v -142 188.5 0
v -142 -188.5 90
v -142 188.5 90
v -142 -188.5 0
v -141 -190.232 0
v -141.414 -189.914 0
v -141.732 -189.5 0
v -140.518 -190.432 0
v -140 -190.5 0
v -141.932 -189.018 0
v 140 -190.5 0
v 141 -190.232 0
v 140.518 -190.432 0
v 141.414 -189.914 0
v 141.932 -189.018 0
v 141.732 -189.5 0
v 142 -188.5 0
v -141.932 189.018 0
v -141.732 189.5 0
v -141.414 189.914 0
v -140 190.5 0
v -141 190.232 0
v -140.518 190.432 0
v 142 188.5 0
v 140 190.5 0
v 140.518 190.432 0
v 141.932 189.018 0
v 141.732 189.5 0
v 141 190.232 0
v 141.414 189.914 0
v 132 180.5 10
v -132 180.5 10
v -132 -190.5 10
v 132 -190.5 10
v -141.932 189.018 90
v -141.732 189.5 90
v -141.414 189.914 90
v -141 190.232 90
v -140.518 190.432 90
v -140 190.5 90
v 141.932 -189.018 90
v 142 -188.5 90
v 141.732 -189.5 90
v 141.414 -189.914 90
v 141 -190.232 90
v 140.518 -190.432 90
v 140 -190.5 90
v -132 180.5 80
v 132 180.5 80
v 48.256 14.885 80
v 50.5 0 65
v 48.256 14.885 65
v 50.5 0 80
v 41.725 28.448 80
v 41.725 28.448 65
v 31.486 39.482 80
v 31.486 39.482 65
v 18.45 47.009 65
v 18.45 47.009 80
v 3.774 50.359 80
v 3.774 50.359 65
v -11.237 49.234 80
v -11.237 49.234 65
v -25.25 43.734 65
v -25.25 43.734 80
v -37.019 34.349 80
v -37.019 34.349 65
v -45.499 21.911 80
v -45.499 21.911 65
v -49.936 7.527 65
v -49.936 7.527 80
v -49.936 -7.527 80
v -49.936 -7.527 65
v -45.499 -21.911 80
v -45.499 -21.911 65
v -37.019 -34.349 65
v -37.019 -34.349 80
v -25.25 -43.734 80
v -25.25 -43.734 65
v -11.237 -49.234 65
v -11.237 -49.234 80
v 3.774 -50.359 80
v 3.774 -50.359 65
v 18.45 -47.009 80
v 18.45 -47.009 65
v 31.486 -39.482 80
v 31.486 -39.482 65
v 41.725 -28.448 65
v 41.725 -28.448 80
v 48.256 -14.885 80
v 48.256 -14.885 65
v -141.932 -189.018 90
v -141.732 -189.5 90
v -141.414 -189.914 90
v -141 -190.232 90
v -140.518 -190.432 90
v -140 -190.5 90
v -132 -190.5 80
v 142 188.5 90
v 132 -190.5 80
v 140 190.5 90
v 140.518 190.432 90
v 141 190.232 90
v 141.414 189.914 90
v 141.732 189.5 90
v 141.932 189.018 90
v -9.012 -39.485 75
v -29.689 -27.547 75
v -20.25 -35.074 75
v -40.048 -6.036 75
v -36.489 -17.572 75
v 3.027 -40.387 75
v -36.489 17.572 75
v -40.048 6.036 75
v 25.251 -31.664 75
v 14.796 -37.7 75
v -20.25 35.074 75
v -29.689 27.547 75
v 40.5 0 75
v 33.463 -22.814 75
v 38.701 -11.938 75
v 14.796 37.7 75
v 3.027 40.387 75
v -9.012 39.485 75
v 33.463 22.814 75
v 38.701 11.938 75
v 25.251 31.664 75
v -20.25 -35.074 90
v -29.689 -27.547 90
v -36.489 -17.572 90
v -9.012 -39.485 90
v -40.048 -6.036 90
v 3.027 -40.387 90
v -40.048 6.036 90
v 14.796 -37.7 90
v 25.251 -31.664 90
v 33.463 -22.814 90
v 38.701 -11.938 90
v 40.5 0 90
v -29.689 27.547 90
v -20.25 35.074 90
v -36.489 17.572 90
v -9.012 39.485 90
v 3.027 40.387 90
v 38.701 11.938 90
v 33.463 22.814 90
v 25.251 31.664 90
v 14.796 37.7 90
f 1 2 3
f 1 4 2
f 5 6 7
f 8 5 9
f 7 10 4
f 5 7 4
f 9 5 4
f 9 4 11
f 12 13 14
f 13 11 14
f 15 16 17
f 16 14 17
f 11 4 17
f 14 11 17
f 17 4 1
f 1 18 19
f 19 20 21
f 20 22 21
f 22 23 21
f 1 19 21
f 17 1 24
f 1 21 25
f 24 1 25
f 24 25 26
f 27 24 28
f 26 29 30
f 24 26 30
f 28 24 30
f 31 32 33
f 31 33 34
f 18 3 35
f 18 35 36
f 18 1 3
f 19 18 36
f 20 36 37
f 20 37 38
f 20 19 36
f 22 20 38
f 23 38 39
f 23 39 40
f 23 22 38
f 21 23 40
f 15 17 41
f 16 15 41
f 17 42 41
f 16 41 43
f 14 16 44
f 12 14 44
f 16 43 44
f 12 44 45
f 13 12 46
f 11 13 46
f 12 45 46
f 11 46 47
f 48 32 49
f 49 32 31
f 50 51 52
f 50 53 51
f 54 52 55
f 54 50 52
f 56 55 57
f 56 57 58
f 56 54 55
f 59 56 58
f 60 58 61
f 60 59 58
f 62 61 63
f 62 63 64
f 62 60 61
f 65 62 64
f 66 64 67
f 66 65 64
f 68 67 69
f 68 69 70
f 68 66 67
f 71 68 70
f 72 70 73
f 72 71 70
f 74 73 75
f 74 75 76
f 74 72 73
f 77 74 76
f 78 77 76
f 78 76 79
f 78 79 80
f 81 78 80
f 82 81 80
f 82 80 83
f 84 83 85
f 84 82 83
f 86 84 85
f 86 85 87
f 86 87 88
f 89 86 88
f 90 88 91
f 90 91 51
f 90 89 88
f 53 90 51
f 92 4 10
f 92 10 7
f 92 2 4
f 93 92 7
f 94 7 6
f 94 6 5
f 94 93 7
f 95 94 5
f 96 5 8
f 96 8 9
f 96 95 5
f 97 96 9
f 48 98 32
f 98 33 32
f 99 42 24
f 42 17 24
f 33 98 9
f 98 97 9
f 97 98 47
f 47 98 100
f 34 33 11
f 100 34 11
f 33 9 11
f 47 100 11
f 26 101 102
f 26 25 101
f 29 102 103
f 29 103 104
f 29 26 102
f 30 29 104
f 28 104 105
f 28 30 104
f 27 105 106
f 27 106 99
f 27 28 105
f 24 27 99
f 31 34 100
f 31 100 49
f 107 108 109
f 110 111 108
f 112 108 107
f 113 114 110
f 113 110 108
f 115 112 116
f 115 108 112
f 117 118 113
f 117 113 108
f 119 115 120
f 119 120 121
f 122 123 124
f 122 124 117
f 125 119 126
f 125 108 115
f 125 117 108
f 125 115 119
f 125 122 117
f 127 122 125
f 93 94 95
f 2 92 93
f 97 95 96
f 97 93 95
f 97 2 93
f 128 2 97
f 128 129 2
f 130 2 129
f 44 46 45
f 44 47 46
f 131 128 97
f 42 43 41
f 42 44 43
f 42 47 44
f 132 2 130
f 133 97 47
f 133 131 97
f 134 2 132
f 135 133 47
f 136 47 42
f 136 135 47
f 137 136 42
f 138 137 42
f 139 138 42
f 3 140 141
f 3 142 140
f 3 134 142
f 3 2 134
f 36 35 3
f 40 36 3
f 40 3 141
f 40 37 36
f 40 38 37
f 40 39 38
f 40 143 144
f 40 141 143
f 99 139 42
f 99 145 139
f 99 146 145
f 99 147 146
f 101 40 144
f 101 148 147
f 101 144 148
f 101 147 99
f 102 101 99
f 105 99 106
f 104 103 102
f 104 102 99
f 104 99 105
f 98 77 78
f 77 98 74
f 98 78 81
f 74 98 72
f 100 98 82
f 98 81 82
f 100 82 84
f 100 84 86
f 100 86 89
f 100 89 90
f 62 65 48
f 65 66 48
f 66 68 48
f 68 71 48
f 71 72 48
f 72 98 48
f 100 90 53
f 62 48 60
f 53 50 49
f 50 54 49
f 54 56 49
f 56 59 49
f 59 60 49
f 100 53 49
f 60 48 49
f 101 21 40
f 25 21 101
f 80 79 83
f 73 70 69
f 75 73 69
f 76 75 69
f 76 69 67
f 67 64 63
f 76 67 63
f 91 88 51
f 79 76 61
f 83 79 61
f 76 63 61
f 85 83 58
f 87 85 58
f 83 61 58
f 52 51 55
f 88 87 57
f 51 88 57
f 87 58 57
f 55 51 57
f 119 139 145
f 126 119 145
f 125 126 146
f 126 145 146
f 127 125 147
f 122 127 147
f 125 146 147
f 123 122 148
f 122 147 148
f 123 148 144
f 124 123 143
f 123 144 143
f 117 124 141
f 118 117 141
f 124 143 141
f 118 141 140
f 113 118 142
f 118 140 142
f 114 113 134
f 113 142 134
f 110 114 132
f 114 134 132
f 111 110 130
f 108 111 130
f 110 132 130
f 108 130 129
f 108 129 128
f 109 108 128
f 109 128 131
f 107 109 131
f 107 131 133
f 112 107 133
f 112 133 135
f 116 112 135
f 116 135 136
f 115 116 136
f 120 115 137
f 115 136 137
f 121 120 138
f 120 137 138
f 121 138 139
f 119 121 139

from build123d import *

# Parameters (mm, degrees)
SKETCH1_W           = 284
SKETCH1_H           = 381
BOSS_EXTRUDE1_DEPTH = 60
SKETCH3_W           = 284
SKETCH3_H           = 381
BOSS_EXTRUDE2_DEPTH = 30
SKETCH4_R           = 40.5
CUT_EXTRUDE1_DEPTH  = 15
SHELL1_T            = -10
FILLET1_R           = 2


with BuildPart() as part:
    # Sketch1 → Boss-Extrude1 (new body)
    with BuildSketch(Plane.XY):
        Rectangle(SKETCH1_W, SKETCH1_H)
    extrude(amount=BOSS_EXTRUDE1_DEPTH)

    # Sketch3 → Boss-Extrude2 (add)
    with BuildSketch(Plane.XY.offset(60)):
        Rectangle(SKETCH3_W, SKETCH3_H)
    extrude(amount=BOSS_EXTRUDE2_DEPTH)

    # Sketch4 → Cut-Extrude1 (cut)
    with BuildSketch(Plane.XY.offset(90)):
        Circle(SKETCH4_R)
    extrude(amount=-CUT_EXTRUDE1_DEPTH, mode=Mode.SUBTRACT)

    # Shell1
    shell1_openings = [part.faces().sort_by_distance(p)[0] for p in [
        (0, -190.5, 45),
    ]]
    offset(amount=SHELL1_T, openings=shell1_openings, kind=Kind.INTERSECTION)

    # Fillet1
    fillet1_edges = [part.edges().sort_by_distance(p)[0] for p in [
        (142, -190.5, 45),
        (-142, -190.5, 45),
        (-142, 190.5, 45),
        (142, 190.5, 45),
    ]]
    fillet(fillet1_edges, radius=FILLET1_R)


solid = part.part
